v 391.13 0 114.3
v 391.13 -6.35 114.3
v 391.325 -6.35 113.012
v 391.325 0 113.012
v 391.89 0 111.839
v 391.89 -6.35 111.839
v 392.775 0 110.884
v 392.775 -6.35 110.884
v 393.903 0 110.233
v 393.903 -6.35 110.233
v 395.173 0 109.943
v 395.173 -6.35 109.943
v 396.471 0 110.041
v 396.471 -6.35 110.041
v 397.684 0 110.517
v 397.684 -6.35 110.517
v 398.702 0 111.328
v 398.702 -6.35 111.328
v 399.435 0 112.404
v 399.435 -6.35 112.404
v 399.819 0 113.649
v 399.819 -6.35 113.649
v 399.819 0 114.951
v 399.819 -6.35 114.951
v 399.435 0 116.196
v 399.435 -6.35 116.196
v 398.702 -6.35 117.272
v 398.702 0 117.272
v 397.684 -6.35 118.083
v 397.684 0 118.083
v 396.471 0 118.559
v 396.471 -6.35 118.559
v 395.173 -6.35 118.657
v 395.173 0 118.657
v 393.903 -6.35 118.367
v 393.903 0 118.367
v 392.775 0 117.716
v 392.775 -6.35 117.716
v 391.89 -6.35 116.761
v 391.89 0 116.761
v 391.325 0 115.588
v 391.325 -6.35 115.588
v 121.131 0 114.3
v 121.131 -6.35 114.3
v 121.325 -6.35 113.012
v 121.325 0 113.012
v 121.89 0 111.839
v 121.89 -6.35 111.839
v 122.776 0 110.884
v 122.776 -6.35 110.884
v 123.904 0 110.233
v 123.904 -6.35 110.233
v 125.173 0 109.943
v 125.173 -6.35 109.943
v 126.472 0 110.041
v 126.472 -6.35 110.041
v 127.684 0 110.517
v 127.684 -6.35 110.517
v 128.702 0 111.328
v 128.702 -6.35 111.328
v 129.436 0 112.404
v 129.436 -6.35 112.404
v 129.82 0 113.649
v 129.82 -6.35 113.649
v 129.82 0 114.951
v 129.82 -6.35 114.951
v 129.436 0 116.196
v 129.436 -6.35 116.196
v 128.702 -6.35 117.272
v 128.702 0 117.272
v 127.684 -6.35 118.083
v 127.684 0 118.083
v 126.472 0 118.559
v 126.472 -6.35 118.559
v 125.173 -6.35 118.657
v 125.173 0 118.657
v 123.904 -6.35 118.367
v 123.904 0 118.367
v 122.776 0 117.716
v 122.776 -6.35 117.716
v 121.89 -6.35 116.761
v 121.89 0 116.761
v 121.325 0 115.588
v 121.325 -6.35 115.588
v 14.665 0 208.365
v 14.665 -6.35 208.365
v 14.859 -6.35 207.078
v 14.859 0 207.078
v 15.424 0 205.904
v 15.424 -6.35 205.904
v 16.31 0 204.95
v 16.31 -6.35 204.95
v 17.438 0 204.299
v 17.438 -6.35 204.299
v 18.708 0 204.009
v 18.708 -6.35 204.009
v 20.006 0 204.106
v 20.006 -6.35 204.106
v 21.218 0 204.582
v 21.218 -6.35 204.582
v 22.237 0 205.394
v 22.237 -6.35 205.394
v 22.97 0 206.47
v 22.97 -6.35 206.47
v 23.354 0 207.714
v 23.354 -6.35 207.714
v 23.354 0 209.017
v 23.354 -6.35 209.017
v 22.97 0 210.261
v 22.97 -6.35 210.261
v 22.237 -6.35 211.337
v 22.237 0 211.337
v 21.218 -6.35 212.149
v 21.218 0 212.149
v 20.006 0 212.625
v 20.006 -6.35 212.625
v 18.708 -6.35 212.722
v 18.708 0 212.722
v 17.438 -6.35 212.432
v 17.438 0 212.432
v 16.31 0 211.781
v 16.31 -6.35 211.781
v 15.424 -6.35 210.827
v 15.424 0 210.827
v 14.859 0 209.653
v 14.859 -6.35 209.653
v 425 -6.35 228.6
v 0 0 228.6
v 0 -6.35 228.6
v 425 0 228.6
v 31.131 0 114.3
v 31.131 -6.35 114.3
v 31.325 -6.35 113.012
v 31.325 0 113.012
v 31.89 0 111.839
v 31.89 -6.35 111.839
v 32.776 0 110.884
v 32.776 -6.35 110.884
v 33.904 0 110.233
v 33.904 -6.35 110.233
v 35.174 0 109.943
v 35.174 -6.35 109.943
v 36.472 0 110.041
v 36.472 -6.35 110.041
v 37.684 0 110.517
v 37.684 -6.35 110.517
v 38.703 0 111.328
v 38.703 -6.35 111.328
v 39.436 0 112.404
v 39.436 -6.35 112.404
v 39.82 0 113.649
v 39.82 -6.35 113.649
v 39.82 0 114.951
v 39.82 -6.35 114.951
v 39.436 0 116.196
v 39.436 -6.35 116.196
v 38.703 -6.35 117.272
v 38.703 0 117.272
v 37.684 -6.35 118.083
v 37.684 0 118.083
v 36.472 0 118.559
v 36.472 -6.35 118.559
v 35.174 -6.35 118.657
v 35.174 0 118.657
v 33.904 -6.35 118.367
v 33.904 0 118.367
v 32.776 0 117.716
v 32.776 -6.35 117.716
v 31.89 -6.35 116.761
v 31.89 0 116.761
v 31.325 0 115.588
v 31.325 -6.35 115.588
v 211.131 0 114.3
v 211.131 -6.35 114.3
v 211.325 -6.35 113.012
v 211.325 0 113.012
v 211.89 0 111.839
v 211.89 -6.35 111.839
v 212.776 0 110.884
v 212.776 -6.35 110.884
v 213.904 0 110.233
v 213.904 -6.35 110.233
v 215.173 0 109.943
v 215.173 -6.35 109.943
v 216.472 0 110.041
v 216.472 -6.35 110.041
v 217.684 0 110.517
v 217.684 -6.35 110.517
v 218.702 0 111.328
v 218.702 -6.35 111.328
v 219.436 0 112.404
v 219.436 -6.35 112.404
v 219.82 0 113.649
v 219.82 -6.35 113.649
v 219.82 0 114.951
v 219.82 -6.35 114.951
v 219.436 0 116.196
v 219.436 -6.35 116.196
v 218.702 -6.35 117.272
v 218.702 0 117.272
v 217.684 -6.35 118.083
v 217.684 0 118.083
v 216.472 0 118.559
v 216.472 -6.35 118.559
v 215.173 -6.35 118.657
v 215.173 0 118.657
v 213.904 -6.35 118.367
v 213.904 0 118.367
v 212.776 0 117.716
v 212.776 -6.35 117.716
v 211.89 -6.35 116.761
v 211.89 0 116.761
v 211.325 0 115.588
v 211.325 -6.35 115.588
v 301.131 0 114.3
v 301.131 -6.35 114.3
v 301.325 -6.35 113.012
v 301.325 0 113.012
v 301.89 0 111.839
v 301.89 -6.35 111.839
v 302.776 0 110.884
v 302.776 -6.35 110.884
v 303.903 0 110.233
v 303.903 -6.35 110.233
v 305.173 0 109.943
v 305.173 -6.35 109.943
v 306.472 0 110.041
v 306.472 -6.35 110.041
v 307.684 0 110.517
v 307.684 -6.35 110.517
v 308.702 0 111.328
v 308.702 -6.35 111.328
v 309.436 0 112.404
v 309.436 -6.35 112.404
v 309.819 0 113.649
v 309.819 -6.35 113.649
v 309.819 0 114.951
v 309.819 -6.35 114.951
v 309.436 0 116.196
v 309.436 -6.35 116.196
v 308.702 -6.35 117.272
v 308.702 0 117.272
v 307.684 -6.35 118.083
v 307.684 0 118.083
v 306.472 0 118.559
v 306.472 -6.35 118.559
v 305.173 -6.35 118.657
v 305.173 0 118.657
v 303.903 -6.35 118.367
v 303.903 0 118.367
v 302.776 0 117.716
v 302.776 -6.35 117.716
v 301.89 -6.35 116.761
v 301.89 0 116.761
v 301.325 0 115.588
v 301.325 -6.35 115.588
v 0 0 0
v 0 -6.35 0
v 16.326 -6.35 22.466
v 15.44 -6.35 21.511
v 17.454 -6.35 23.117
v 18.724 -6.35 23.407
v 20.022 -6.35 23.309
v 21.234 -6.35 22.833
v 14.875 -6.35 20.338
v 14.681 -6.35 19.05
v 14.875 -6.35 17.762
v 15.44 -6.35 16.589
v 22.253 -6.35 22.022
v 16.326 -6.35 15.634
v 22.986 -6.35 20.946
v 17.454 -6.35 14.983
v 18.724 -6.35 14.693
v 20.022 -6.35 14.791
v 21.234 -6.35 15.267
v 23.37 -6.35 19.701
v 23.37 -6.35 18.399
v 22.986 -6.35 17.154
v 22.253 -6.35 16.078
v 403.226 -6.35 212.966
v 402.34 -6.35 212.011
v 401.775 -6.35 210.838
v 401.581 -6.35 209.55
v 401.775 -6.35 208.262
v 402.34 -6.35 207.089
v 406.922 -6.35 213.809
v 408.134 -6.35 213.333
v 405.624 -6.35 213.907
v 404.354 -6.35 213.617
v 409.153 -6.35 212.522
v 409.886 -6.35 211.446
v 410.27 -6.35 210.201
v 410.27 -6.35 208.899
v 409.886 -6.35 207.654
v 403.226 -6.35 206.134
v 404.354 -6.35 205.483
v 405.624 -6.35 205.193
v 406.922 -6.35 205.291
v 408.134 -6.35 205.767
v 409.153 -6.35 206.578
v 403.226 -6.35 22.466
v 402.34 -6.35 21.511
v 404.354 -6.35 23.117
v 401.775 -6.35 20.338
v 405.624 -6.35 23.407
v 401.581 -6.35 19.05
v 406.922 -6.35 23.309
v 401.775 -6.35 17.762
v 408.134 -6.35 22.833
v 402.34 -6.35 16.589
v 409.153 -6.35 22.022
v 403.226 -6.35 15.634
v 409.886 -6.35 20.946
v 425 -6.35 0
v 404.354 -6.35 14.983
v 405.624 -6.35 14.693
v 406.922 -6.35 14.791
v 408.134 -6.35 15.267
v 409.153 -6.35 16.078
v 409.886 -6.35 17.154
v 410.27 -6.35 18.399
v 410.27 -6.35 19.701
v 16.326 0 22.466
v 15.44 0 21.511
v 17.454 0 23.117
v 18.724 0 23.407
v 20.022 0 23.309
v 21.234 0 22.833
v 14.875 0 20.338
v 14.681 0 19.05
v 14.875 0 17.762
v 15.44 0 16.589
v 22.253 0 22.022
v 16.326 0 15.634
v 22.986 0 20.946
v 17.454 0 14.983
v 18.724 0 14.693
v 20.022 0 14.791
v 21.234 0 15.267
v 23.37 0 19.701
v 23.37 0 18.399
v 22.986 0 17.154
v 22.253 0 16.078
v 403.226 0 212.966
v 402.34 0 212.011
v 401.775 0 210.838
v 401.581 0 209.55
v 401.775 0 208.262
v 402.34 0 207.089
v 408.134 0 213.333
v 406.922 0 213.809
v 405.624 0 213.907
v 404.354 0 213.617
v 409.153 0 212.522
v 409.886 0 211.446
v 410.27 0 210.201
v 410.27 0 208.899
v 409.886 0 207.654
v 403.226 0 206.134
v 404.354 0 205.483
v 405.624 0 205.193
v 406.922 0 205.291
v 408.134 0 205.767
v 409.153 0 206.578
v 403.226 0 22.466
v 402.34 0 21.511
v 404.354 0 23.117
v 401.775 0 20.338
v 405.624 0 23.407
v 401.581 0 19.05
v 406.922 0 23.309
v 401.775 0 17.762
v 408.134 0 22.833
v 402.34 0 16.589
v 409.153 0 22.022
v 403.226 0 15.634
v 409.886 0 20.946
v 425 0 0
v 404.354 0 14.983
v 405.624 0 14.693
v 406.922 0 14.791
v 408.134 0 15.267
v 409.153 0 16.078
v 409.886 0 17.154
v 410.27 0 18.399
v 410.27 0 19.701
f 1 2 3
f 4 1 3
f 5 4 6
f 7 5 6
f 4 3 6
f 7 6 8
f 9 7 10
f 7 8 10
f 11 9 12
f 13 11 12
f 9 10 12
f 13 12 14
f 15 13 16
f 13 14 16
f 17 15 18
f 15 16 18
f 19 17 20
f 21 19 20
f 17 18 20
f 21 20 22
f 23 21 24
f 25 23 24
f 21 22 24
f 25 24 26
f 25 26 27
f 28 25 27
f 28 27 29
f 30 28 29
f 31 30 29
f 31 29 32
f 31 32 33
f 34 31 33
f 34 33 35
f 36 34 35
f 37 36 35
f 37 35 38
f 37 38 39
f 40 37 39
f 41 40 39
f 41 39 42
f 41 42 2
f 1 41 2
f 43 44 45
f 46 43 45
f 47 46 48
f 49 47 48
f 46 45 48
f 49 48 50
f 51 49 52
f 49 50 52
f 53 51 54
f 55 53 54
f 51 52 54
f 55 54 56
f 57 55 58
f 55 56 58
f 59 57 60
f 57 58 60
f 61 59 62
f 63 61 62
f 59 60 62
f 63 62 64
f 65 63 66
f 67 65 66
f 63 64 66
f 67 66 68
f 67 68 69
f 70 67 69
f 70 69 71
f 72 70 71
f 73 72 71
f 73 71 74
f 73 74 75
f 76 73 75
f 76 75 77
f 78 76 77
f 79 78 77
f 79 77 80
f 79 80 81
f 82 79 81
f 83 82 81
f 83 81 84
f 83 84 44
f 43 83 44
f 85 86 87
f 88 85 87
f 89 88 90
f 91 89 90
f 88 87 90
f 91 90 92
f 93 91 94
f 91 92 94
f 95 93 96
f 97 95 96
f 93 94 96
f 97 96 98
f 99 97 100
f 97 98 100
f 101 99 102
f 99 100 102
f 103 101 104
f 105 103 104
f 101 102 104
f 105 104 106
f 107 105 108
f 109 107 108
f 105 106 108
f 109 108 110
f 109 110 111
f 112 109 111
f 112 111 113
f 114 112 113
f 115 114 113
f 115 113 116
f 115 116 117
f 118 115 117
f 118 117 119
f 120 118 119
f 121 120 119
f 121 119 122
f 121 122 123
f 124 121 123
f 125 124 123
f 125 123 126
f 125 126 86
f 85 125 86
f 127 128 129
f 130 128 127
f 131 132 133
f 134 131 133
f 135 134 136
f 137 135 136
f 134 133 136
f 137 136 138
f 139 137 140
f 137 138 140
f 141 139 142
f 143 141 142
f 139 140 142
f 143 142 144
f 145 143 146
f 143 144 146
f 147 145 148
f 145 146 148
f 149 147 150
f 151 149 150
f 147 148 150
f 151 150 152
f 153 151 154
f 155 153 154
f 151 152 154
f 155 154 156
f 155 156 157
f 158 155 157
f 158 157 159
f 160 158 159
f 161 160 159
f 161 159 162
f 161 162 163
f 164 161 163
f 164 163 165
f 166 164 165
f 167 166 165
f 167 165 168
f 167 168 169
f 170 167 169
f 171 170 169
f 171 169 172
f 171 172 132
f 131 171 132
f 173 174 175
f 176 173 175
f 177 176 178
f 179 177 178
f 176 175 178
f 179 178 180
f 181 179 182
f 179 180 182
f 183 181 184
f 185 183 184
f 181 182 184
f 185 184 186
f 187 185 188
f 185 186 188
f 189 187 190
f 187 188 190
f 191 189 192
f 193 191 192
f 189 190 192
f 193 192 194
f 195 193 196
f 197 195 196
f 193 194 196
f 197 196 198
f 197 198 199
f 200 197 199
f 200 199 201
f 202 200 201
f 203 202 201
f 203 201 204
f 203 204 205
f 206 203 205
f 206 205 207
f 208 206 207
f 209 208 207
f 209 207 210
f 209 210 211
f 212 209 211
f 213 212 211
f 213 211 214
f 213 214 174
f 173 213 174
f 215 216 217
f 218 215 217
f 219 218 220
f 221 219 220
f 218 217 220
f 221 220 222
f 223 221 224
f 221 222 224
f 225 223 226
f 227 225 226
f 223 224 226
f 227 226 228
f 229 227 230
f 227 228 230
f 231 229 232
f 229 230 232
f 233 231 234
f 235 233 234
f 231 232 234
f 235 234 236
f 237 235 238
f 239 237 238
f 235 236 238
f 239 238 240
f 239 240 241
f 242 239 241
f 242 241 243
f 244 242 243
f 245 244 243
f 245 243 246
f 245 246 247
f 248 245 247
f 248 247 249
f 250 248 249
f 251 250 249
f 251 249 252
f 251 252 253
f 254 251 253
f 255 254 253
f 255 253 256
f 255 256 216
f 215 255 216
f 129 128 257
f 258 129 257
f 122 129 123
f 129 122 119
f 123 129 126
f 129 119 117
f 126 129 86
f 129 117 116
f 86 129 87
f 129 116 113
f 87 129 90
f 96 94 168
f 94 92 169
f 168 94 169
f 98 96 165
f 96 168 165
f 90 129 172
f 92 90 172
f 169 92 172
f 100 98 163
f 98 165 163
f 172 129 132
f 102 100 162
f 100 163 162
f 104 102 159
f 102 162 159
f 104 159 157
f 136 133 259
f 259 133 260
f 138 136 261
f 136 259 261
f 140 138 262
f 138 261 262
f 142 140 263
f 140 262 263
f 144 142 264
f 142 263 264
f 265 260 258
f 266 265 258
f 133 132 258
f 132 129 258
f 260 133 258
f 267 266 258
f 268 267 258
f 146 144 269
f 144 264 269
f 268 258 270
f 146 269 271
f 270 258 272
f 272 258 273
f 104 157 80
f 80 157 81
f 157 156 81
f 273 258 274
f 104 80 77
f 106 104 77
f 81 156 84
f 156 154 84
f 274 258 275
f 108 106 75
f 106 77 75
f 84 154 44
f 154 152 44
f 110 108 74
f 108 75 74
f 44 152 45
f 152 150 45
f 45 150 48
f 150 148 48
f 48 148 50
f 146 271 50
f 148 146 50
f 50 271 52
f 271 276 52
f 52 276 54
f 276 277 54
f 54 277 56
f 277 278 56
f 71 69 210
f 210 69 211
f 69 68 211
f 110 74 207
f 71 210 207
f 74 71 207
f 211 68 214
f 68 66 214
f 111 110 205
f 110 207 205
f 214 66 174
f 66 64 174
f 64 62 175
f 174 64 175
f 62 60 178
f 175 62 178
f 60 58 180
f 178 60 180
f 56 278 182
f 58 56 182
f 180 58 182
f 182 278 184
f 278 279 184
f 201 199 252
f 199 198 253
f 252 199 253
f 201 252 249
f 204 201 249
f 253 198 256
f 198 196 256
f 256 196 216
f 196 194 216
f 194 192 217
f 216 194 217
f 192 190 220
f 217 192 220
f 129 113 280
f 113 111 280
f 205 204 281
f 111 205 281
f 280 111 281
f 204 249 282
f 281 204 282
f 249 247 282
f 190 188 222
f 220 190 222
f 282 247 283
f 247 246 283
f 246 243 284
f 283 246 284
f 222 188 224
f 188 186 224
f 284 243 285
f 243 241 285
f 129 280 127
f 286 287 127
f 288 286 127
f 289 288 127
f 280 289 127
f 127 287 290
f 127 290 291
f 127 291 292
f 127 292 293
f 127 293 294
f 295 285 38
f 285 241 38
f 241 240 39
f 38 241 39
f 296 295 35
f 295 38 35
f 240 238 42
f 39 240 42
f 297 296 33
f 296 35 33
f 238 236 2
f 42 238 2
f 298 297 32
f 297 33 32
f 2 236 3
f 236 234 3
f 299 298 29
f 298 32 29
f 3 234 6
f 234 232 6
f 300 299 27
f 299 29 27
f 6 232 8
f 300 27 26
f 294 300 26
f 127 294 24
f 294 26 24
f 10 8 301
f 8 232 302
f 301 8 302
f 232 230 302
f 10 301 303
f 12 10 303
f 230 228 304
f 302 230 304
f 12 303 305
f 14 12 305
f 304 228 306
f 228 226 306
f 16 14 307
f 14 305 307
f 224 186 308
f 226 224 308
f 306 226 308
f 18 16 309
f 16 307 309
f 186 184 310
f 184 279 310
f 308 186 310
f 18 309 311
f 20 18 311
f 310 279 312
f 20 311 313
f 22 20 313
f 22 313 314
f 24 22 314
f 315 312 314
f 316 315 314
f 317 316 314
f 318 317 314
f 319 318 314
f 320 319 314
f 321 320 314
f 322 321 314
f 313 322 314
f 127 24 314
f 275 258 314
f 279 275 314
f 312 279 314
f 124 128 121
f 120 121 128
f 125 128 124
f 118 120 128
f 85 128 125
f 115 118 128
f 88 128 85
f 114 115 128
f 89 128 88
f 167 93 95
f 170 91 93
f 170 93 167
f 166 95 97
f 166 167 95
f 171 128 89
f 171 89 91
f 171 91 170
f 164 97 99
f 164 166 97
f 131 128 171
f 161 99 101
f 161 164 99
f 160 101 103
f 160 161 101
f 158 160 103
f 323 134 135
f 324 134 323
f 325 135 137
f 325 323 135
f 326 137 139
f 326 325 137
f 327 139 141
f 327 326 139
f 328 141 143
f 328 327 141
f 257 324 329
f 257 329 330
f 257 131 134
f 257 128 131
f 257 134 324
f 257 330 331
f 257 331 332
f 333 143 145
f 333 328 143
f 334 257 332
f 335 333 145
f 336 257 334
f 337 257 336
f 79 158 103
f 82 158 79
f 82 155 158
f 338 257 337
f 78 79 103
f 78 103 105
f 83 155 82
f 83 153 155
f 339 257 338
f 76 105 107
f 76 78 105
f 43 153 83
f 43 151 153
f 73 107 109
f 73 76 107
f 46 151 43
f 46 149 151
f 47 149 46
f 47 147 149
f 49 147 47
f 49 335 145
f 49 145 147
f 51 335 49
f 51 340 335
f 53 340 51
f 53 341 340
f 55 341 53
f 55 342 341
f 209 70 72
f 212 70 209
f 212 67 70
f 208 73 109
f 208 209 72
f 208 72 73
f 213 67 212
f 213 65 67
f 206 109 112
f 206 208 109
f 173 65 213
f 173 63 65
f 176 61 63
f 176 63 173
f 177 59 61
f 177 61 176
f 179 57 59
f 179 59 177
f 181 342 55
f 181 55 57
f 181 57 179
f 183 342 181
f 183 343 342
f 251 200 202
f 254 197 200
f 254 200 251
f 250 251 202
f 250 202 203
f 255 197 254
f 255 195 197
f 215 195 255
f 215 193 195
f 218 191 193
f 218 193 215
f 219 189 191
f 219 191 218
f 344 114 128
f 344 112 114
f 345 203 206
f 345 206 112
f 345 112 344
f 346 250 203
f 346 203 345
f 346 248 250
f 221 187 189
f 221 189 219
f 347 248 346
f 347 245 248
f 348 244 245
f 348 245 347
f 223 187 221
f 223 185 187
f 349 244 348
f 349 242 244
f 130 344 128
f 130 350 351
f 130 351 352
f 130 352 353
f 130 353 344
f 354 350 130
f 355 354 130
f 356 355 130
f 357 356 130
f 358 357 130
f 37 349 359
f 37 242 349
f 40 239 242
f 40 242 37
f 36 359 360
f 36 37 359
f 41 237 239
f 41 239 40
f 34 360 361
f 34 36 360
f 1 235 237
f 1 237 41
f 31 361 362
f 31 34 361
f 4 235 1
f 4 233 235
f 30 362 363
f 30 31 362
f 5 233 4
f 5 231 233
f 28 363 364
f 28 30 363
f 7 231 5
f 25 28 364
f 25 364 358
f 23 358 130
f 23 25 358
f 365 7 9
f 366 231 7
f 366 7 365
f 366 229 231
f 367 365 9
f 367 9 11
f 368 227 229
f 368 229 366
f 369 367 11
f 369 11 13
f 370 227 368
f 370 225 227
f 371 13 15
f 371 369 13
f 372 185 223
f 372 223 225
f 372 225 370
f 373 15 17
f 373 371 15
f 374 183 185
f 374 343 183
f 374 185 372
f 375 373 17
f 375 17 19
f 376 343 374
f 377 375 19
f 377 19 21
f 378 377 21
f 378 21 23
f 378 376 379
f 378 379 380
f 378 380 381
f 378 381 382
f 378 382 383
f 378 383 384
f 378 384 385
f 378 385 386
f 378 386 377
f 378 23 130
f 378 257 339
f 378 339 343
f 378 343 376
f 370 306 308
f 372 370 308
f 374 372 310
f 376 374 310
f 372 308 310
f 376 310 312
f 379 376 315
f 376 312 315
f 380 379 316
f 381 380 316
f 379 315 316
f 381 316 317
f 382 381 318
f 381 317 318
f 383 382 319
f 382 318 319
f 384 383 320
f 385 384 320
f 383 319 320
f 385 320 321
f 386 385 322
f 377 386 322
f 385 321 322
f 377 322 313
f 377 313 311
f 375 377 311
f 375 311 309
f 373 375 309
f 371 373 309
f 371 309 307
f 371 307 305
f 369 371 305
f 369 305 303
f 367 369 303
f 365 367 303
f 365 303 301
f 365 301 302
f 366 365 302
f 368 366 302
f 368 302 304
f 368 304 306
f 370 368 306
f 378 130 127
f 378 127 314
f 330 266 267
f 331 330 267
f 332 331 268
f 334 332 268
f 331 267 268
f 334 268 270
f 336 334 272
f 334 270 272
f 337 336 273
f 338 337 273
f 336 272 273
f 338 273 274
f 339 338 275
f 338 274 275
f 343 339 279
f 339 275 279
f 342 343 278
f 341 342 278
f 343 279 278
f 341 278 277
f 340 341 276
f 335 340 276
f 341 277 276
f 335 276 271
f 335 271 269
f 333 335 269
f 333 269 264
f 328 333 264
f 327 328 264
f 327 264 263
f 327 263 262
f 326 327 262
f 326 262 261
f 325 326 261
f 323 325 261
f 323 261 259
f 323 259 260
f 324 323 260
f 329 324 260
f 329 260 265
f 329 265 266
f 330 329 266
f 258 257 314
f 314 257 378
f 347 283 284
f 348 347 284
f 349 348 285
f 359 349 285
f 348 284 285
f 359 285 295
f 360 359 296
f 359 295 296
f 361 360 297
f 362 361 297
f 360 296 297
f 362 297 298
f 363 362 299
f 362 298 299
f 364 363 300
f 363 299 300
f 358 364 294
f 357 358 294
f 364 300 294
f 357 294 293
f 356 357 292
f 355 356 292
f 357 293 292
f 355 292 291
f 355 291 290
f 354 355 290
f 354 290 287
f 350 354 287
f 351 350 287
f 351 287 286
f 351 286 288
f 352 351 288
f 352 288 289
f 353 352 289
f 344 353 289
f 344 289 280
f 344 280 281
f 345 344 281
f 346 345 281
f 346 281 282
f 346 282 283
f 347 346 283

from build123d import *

# Parameters (mm, degrees)
SKETCH1_W                             = 425
SKETCH1_H                             = 228.6
BASE_DEPTH                            = 6.35
HOLE_FOR_1_4_BLIND_FASTENERS_B_BS_1_D = 8.7376
HOLE_FOR_1_4_BLIND_FASTENERS_B_BS_2_D = 8.7376


with BuildPart() as part:
    # Sketch1 → Base (new body)
    with BuildSketch(Plane(origin=(0, 0, 0), x_dir=(1, 0, 0), z_dir=(0, 1, 0))):
        with Locations((212.5, -114.3)):
            Rectangle(SKETCH1_W, SKETCH1_H)
    extrude(amount=-BASE_DEPTH)

    # Hole for 1/4 Blind Fasteners (B,BS)1 (through all)
    with Locations(Plane(origin=(0, 0, 0), x_dir=(1, 0, 0), z_dir=(0, 1, 0))):
        with Locations((35.5, -114.3), (125.49982, -114.3), (215.49964, -114.3), (305.49946, -114.3), (395.49928, -114.3)):
            Hole(HOLE_FOR_1_4_BLIND_FASTENERS_B_BS_1_D / 2)

    # Hole for 1/4 Blind Fasteners (B,BS)2 (through all)
    with Locations(Plane(origin=(0, 0, 0), x_dir=(1, 0, 0), z_dir=(0, 1, 0))):
        with Locations((19.05, -19.05), (19.03407818, -208.365498456), (405.95, -19.05), (405.95, -209.55)):
            Hole(HOLE_FOR_1_4_BLIND_FASTENERS_B_BS_2_D / 2)


solid = part.part
